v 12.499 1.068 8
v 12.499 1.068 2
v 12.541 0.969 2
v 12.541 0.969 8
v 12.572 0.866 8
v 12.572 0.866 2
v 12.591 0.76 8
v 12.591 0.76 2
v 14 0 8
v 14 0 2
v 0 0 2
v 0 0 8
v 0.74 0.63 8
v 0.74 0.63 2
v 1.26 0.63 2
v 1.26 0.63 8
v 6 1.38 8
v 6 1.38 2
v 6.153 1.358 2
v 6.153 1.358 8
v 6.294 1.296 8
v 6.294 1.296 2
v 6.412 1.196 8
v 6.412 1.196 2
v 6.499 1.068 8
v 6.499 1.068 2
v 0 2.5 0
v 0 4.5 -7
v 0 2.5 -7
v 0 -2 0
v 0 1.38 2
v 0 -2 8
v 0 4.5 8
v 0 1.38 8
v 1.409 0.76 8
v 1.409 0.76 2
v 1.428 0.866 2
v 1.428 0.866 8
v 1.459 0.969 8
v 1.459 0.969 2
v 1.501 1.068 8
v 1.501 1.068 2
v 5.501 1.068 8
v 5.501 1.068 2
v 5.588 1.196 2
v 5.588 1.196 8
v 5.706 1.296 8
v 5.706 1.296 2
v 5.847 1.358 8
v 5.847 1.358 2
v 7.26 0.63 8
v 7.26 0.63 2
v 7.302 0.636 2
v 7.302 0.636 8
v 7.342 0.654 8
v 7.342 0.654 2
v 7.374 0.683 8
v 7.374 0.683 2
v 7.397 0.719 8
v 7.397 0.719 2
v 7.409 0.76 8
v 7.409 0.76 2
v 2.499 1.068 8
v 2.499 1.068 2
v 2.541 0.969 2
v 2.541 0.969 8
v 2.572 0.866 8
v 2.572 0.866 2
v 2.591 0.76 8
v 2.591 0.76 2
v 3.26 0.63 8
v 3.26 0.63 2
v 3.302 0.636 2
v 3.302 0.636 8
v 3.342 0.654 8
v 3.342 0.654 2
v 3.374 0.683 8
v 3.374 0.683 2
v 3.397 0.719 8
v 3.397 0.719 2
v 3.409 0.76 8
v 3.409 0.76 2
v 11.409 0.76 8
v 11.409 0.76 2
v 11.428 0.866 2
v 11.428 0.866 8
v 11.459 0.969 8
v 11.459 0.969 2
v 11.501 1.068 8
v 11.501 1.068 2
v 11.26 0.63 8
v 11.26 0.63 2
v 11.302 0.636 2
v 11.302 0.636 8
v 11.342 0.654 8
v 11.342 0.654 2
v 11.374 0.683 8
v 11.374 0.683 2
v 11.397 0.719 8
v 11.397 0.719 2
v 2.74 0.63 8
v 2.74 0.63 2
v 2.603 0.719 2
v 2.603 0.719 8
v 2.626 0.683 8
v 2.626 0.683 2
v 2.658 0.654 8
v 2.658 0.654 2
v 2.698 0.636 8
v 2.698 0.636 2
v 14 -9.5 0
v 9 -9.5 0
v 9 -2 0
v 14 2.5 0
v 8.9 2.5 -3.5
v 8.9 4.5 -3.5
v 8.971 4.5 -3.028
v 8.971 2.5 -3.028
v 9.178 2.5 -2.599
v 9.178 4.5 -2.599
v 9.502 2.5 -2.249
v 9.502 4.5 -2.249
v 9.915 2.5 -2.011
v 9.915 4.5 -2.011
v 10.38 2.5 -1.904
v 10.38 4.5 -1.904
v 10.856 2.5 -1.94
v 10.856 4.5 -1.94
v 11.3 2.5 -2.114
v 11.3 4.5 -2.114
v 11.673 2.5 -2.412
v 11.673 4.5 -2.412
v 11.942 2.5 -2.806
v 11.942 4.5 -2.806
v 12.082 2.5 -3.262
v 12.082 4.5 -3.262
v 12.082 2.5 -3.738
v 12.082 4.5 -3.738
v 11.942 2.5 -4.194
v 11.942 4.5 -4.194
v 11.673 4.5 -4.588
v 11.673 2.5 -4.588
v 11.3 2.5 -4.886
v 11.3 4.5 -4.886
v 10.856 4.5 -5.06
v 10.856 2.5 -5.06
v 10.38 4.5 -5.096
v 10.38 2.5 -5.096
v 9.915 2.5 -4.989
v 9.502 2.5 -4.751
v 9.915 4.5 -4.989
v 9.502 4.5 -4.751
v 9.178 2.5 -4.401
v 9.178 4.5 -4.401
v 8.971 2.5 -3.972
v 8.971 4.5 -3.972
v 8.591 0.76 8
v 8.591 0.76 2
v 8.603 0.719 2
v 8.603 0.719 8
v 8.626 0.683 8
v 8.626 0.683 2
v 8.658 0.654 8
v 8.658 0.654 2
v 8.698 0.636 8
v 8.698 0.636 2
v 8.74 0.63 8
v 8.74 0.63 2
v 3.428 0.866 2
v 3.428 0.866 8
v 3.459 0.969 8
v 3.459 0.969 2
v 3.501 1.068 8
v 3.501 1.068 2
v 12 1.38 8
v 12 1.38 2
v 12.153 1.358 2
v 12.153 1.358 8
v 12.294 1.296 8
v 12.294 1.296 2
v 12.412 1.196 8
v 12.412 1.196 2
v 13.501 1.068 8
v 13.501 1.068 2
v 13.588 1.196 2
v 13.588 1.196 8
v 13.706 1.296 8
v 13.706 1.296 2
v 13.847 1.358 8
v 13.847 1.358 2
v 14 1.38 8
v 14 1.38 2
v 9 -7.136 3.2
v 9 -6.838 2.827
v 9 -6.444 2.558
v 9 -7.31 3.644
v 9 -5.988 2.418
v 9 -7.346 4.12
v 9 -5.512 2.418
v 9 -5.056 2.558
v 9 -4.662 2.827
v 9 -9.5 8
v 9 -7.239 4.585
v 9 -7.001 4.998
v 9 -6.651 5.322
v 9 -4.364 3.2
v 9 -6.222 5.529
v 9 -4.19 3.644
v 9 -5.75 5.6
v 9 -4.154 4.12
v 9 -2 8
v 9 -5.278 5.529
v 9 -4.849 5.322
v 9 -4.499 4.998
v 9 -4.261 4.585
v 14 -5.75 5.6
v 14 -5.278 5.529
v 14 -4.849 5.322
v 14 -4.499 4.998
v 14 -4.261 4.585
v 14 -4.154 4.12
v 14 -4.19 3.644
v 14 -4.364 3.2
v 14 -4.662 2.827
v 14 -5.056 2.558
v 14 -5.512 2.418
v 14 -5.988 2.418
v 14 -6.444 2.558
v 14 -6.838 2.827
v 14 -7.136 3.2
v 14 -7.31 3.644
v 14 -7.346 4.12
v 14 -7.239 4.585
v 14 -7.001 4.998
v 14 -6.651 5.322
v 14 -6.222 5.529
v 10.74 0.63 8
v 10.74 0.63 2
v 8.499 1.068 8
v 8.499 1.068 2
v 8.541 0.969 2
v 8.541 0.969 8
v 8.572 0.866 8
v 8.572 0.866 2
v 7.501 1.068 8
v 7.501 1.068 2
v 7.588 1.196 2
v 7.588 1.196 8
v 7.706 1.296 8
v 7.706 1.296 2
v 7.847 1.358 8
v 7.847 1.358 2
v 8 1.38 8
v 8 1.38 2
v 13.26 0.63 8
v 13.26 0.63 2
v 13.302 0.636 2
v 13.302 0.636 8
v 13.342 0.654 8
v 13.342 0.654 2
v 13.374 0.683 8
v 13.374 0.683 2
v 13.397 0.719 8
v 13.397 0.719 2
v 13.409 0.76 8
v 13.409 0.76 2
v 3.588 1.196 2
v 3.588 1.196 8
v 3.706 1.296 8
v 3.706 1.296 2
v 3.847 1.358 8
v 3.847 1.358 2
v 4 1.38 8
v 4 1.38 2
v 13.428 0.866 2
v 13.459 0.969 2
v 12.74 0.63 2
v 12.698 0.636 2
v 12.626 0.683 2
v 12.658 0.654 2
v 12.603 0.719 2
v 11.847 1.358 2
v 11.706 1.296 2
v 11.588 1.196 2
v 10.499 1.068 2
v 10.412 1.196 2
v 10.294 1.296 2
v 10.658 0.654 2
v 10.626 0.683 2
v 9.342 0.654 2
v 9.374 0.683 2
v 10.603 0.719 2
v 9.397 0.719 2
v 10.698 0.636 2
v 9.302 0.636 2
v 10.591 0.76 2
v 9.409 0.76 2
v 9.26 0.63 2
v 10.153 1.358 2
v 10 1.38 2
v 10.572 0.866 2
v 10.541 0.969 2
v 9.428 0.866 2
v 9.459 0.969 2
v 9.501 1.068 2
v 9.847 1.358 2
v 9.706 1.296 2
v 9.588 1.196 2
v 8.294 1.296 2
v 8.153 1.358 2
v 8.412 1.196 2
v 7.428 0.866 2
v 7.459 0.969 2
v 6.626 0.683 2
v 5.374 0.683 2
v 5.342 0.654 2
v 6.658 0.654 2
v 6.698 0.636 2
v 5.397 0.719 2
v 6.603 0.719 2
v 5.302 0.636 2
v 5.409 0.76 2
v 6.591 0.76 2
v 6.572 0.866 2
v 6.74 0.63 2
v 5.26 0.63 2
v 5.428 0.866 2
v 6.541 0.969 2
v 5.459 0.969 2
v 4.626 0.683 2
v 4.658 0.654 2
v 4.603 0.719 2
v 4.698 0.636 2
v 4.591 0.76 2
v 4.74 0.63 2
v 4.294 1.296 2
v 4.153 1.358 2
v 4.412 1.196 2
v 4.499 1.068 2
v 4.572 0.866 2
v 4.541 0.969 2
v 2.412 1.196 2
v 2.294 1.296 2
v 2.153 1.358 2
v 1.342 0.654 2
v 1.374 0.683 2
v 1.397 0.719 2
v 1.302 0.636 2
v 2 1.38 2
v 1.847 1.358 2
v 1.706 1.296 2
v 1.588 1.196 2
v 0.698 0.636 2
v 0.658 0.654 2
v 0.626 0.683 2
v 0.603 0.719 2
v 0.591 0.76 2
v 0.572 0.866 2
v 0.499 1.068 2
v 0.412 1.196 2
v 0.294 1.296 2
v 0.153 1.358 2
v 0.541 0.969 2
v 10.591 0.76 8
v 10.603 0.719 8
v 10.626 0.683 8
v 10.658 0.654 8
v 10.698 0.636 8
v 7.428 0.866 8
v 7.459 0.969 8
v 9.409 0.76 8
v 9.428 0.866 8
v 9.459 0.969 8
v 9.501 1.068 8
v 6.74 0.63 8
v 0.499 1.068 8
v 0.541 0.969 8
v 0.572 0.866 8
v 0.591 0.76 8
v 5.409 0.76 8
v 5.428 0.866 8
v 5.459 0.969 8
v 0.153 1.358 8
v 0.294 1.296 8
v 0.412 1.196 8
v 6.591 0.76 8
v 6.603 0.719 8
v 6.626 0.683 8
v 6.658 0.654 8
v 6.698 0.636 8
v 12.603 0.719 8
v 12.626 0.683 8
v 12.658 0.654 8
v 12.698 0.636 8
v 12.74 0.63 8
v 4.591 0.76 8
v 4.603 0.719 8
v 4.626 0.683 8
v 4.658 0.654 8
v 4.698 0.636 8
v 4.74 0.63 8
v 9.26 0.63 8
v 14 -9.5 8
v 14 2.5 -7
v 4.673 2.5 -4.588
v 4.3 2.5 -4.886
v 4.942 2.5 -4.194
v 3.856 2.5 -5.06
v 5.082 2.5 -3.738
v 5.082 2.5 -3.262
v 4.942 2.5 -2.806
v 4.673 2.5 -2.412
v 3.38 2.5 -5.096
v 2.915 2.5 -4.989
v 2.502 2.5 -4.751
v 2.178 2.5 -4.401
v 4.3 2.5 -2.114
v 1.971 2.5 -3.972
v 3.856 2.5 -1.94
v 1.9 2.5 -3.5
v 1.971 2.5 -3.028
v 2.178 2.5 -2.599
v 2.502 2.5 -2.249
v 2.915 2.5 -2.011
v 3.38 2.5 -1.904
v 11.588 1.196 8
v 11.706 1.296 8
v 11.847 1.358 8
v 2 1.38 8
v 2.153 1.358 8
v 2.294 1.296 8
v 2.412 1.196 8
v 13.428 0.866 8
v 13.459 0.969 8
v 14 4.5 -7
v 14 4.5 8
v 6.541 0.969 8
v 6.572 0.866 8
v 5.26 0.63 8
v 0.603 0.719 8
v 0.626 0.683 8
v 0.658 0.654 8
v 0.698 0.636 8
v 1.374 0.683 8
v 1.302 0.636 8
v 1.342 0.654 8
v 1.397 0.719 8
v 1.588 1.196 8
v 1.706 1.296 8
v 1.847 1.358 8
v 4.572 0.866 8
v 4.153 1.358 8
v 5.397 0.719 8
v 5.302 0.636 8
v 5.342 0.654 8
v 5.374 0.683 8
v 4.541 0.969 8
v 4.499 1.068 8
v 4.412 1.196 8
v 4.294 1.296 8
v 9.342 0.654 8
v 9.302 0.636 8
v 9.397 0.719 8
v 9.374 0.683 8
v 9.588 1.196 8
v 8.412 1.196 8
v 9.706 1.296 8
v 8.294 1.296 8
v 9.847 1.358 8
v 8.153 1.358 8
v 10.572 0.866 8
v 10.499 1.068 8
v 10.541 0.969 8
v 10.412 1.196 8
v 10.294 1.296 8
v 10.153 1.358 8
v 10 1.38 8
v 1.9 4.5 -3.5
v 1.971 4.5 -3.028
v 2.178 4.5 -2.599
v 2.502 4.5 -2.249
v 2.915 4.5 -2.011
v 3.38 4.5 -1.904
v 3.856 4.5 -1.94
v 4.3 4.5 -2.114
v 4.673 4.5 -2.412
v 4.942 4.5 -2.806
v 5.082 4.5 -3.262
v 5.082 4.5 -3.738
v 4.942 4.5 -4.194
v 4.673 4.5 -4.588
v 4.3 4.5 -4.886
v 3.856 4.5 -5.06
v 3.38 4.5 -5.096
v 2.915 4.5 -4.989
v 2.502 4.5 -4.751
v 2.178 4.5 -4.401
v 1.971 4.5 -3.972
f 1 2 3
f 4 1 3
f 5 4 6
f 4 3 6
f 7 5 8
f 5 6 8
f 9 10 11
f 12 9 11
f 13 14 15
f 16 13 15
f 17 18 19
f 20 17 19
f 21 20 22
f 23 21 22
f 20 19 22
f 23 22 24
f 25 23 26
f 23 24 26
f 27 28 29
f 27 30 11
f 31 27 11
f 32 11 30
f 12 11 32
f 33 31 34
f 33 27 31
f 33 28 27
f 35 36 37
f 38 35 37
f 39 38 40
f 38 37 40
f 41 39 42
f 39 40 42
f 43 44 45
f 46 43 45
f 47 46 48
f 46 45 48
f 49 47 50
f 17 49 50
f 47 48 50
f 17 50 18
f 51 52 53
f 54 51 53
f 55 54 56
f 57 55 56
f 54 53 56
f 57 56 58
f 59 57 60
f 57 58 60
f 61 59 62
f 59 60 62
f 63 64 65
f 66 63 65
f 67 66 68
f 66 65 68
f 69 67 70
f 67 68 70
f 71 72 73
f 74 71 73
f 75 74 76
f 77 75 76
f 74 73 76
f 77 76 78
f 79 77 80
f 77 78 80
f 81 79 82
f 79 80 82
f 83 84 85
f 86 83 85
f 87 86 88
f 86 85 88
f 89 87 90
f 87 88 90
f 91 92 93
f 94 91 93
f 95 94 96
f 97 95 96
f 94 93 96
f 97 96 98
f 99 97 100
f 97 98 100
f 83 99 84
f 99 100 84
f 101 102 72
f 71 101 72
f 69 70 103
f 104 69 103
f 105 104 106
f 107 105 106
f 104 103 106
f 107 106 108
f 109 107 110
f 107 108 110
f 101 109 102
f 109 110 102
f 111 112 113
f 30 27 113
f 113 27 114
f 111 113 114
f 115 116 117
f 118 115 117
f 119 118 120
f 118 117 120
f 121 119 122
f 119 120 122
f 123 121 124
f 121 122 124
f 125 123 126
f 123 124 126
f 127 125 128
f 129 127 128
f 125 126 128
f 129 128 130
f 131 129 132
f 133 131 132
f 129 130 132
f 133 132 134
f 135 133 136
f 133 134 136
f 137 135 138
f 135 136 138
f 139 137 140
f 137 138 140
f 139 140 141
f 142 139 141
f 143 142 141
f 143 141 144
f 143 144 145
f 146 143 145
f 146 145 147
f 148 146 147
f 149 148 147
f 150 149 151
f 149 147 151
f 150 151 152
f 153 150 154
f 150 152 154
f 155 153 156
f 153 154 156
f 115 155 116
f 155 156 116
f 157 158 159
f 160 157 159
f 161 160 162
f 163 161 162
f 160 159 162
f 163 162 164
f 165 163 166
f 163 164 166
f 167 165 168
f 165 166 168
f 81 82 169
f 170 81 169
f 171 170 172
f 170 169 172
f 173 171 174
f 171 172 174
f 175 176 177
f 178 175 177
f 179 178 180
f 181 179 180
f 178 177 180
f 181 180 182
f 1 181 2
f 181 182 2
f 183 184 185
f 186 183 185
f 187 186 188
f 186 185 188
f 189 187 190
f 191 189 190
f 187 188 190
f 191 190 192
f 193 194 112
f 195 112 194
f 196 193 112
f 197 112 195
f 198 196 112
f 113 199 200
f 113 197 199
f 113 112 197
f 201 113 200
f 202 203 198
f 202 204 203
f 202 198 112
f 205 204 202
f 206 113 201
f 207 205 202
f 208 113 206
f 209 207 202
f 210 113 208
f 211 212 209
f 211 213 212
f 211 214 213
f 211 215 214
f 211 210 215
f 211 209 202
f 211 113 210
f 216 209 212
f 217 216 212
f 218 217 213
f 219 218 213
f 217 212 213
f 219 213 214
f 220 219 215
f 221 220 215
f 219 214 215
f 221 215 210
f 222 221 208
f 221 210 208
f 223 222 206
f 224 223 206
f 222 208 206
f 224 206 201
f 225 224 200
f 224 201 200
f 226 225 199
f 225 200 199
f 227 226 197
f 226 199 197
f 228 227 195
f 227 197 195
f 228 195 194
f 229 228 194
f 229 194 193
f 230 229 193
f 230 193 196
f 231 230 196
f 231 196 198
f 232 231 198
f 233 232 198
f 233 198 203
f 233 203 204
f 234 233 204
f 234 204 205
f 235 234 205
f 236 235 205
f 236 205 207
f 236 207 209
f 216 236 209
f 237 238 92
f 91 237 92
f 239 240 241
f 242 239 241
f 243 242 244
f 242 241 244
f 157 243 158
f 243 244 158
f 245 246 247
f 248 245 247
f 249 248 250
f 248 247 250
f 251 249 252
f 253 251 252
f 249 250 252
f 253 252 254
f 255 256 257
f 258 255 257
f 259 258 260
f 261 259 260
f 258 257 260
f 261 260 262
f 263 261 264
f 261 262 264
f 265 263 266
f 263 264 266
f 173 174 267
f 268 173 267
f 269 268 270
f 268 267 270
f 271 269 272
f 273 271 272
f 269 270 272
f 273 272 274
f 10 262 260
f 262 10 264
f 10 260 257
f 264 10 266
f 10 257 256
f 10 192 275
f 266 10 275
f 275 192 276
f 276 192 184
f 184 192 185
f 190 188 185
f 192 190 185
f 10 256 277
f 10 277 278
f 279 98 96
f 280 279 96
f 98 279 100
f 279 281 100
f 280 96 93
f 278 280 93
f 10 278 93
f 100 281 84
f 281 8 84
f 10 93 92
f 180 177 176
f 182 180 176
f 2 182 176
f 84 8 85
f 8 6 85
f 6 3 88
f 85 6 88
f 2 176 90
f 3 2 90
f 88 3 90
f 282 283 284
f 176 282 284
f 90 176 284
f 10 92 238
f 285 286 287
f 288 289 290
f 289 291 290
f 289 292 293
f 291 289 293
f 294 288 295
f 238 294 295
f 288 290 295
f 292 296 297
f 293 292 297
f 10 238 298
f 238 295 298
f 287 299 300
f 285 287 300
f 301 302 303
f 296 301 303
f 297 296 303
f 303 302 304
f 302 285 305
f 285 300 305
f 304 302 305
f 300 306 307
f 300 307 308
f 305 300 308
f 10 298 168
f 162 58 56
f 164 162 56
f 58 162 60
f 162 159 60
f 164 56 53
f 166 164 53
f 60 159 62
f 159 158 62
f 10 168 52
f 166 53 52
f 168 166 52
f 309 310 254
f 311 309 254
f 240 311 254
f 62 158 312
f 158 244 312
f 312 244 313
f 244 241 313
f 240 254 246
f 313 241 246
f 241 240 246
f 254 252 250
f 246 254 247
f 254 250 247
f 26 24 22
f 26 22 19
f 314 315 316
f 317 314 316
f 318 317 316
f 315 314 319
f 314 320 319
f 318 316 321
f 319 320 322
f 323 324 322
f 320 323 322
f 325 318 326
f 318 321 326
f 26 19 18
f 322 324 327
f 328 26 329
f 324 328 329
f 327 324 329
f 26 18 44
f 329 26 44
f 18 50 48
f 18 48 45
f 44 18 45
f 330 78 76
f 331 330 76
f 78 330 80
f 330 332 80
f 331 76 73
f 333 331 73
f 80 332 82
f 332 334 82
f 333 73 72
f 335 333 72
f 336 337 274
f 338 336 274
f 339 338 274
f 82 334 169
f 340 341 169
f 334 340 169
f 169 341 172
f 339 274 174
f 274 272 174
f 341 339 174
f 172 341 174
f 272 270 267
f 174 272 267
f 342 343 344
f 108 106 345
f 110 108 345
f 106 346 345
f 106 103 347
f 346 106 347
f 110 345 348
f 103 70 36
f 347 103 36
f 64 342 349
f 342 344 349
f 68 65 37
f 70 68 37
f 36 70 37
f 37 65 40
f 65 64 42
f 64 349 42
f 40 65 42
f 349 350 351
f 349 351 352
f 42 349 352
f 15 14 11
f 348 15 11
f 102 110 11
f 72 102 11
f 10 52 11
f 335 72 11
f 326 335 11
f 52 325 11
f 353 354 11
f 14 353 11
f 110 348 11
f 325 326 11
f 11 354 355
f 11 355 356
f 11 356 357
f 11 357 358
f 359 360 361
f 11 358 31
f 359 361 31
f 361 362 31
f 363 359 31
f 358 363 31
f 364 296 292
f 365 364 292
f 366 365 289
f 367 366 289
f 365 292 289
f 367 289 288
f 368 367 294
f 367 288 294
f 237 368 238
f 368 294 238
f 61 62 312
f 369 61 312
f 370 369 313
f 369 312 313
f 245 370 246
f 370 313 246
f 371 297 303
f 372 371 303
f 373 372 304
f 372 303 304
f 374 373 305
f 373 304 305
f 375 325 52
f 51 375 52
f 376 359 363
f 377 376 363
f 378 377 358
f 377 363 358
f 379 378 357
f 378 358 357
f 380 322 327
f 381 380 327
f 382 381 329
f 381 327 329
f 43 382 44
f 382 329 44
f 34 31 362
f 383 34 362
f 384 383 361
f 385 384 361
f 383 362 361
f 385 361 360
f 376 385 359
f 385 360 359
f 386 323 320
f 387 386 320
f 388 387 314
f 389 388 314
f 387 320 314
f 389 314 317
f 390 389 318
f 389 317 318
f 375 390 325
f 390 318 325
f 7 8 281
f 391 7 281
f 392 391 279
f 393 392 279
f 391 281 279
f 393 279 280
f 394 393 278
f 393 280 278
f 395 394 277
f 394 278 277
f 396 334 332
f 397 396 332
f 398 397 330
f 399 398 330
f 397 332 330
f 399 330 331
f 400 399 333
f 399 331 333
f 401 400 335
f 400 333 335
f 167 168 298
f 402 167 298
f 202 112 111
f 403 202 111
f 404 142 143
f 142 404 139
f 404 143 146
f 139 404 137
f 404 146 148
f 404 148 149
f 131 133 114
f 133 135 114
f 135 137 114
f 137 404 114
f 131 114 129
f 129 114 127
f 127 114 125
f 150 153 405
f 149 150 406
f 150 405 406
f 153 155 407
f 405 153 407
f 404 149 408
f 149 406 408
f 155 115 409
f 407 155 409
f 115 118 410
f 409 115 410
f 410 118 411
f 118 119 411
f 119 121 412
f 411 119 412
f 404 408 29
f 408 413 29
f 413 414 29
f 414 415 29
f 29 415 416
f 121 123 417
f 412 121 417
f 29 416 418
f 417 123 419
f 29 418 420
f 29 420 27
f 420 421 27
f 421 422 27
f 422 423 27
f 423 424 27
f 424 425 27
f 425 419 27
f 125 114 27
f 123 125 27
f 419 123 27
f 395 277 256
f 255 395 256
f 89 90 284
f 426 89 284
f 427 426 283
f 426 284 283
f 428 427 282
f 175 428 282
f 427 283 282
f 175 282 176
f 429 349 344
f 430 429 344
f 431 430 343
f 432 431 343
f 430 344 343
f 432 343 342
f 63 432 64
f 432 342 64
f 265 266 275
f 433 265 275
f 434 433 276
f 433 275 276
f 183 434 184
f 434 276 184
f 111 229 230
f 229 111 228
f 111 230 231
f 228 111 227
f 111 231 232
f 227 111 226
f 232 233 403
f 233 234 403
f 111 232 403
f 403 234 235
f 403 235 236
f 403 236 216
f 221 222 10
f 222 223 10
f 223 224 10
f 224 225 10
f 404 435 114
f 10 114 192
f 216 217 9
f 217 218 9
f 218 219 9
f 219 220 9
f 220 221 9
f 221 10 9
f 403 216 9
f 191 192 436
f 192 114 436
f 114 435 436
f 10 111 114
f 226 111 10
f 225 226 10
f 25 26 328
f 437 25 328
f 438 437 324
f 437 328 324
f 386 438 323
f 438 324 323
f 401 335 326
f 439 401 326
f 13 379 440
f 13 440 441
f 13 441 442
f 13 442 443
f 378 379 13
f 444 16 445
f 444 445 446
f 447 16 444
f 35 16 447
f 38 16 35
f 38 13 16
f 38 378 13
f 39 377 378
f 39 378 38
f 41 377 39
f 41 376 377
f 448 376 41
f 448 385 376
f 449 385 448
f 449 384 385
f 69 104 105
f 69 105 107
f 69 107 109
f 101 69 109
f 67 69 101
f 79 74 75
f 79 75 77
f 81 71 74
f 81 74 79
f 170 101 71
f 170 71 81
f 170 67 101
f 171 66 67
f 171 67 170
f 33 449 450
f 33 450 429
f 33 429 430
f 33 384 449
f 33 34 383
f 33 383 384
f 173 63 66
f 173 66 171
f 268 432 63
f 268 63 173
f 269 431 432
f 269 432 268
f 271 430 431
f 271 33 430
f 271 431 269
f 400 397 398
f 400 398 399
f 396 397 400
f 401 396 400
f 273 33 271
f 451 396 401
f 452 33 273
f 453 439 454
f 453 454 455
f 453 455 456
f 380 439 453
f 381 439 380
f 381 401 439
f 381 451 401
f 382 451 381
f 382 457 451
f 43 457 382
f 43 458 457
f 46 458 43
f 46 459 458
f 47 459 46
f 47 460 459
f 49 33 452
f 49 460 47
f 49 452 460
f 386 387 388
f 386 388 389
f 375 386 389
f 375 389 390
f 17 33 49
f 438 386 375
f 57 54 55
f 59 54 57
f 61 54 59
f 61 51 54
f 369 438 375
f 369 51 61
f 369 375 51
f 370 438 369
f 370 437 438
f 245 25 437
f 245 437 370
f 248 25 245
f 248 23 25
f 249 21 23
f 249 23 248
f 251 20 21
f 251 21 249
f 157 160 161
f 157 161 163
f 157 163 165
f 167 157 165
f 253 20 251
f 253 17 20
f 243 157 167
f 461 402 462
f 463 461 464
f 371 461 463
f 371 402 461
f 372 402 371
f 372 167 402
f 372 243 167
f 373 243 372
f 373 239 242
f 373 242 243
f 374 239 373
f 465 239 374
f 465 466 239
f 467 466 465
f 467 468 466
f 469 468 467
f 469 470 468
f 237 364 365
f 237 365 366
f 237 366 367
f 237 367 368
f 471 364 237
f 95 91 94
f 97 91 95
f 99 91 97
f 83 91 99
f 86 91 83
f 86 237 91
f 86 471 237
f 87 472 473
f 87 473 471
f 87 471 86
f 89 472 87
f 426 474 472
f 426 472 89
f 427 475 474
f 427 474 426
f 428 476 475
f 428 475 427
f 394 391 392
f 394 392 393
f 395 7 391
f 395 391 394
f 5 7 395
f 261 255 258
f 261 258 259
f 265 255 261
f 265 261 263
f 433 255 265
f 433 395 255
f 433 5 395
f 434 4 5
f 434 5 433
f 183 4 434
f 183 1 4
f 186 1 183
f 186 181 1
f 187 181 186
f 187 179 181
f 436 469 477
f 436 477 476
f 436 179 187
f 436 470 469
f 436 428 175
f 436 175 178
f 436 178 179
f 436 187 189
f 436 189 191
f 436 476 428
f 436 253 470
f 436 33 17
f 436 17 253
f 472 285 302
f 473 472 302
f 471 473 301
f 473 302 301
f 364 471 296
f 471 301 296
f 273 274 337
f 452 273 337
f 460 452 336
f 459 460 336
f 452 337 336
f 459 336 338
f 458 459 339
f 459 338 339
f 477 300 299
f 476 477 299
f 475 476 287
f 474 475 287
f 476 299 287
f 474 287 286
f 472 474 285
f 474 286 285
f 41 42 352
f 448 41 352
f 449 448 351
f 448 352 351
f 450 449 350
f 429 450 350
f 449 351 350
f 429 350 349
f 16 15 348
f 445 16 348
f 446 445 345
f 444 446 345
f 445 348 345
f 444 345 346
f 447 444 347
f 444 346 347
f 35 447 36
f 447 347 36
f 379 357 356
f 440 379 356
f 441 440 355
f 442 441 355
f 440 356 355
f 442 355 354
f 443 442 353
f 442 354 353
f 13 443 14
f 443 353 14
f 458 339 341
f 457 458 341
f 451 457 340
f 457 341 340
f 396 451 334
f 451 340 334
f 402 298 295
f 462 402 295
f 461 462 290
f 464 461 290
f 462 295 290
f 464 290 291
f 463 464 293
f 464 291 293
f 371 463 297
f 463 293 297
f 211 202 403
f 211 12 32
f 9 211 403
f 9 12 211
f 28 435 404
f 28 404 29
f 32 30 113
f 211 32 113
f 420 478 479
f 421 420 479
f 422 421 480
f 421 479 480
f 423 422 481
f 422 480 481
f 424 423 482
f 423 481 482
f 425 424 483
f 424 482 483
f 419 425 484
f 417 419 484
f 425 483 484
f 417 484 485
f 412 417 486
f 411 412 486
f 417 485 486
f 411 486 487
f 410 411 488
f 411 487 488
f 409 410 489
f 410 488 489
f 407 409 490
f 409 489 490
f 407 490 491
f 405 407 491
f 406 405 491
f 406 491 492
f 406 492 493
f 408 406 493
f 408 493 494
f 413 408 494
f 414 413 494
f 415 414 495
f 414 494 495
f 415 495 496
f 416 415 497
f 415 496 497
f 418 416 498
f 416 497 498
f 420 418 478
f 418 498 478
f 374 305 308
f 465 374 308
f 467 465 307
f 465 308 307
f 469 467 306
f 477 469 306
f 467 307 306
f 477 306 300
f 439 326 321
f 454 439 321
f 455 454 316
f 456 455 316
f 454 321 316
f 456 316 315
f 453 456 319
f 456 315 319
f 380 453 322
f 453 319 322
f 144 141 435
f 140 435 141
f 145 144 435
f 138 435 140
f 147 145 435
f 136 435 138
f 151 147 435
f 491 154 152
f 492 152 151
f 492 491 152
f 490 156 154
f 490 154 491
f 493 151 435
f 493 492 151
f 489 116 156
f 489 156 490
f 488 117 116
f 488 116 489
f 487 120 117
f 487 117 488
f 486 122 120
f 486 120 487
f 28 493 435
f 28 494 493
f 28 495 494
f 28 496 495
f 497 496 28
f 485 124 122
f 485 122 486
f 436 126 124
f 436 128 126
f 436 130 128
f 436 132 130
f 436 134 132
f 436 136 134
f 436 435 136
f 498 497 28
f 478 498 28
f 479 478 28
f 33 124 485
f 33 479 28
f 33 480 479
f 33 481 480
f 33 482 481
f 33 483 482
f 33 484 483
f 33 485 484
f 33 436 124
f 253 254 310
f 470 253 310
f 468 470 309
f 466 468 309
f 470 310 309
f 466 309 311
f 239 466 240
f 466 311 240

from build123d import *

# Parameters (mm, degrees)
SKETCH3_W           = 14
SKETCH3_H           = 6.5
BOSS_EXTRUDE2_DEPTH = 8
CUT_EXTRUDE1_START  = 2
CUT_EXTRUDE1_DEPTH  = 6
LPATTERN2_COUNT     = 7
LPATTERN2_PITCH     = 2
SKETCH4_W           = 14
SKETCH4_H           = 7
SKETCH4_R           = 1.6
BOSS_EXTRUDE3_DEPTH = 2
SKETCH5_W           = 5
SKETCH5_H           = 8
BOSS_EXTRUDE4_DEPTH = 7.5
SKETCH6_R           = 1.6
CUT_EXTRUDE2_DEPTH  = 7.5


with BuildPart() as part:
    # Sketch3 → Boss-Extrude2 (new body)
    with BuildSketch(Plane.XY):
        with Locations((7, 1.25)):
            Rectangle(SKETCH3_W, SKETCH3_H)
    extrude(amount=BOSS_EXTRUDE2_DEPTH)

    # Sketch1 → Cut-Extrude1 (cut)
    with BuildSketch(Plane.XY.offset(CUT_EXTRUDE1_START)):
        with BuildLine():
            Line((0.740175425, 0.63), (1.259824575, 0.63))
            ThreePointArc((1.259824575, 0.63), (1.358731646, 0.667228588), (1.408543109, 0.760434783))
            ThreePointArc((1.408543109, 0.760434783), (1.442388286, 0.918062154), (1.501123596, 1.068202247))
            ThreePointArc((1.501123596, 1.068202247), (1.705850588, 1.295639059), (2, 1.38))
            Line((2, 1.38), (2, 0))
            Line((2, 0), (0, 0))
            Line((0, 0), (0, 1.38))
            ThreePointArc((0, 1.38), (0.294149412, 1.295639059), (0.498876404, 1.068202247))
            ThreePointArc((0.498876404, 1.068202247), (0.557611714, 0.918062154), (0.591456891, 0.760434783))
            ThreePointArc((0.591456891, 0.760434783), (0.641268354, 0.667228588), (0.740175425, 0.63))
        make_face()
    cut_extrude1 = extrude(amount=CUT_EXTRUDE1_DEPTH, mode=Mode.SUBTRACT)

    # LPattern2: Cut-Extrude1 ×7
    with Locations(*[(i * LPATTERN2_PITCH, 0, 0) for i in range(1, LPATTERN2_COUNT)]):
        add(cut_extrude1, mode=Mode.SUBTRACT)

    # Sketch4 → Boss-Extrude3 (add)
    with BuildSketch(Plane(origin=(0, 4.5, 0), x_dir=(-1, 0, 0), z_dir=(0, 1, 0))):
        with Locations((-7, -3.5)):
            Rectangle(SKETCH4_W, SKETCH4_H)
        with Locations((-10.5, -3.5)):
            Circle(SKETCH4_R, mode=Mode.SUBTRACT)
        with Locations((-3.5, -3.5)):
            Circle(SKETCH4_R, mode=Mode.SUBTRACT)
    extrude(amount=-BOSS_EXTRUDE3_DEPTH)

    # Sketch5 → Boss-Extrude4 (add)
    with BuildSketch(Plane.XZ.offset(2)):
        with Locations((11.5, 4)):
            Rectangle(SKETCH5_W, SKETCH5_H)
    extrude(amount=BOSS_EXTRUDE4_DEPTH)

    # Sketch6 → Cut-Extrude2 (cut)
    with BuildSketch(Plane.ZY.offset(-9)):
        with Locations((4, -5.75)):
            Circle(SKETCH6_R)
    extrude(amount=-CUT_EXTRUDE2_DEPTH, mode=Mode.SUBTRACT)


solid = part.part
